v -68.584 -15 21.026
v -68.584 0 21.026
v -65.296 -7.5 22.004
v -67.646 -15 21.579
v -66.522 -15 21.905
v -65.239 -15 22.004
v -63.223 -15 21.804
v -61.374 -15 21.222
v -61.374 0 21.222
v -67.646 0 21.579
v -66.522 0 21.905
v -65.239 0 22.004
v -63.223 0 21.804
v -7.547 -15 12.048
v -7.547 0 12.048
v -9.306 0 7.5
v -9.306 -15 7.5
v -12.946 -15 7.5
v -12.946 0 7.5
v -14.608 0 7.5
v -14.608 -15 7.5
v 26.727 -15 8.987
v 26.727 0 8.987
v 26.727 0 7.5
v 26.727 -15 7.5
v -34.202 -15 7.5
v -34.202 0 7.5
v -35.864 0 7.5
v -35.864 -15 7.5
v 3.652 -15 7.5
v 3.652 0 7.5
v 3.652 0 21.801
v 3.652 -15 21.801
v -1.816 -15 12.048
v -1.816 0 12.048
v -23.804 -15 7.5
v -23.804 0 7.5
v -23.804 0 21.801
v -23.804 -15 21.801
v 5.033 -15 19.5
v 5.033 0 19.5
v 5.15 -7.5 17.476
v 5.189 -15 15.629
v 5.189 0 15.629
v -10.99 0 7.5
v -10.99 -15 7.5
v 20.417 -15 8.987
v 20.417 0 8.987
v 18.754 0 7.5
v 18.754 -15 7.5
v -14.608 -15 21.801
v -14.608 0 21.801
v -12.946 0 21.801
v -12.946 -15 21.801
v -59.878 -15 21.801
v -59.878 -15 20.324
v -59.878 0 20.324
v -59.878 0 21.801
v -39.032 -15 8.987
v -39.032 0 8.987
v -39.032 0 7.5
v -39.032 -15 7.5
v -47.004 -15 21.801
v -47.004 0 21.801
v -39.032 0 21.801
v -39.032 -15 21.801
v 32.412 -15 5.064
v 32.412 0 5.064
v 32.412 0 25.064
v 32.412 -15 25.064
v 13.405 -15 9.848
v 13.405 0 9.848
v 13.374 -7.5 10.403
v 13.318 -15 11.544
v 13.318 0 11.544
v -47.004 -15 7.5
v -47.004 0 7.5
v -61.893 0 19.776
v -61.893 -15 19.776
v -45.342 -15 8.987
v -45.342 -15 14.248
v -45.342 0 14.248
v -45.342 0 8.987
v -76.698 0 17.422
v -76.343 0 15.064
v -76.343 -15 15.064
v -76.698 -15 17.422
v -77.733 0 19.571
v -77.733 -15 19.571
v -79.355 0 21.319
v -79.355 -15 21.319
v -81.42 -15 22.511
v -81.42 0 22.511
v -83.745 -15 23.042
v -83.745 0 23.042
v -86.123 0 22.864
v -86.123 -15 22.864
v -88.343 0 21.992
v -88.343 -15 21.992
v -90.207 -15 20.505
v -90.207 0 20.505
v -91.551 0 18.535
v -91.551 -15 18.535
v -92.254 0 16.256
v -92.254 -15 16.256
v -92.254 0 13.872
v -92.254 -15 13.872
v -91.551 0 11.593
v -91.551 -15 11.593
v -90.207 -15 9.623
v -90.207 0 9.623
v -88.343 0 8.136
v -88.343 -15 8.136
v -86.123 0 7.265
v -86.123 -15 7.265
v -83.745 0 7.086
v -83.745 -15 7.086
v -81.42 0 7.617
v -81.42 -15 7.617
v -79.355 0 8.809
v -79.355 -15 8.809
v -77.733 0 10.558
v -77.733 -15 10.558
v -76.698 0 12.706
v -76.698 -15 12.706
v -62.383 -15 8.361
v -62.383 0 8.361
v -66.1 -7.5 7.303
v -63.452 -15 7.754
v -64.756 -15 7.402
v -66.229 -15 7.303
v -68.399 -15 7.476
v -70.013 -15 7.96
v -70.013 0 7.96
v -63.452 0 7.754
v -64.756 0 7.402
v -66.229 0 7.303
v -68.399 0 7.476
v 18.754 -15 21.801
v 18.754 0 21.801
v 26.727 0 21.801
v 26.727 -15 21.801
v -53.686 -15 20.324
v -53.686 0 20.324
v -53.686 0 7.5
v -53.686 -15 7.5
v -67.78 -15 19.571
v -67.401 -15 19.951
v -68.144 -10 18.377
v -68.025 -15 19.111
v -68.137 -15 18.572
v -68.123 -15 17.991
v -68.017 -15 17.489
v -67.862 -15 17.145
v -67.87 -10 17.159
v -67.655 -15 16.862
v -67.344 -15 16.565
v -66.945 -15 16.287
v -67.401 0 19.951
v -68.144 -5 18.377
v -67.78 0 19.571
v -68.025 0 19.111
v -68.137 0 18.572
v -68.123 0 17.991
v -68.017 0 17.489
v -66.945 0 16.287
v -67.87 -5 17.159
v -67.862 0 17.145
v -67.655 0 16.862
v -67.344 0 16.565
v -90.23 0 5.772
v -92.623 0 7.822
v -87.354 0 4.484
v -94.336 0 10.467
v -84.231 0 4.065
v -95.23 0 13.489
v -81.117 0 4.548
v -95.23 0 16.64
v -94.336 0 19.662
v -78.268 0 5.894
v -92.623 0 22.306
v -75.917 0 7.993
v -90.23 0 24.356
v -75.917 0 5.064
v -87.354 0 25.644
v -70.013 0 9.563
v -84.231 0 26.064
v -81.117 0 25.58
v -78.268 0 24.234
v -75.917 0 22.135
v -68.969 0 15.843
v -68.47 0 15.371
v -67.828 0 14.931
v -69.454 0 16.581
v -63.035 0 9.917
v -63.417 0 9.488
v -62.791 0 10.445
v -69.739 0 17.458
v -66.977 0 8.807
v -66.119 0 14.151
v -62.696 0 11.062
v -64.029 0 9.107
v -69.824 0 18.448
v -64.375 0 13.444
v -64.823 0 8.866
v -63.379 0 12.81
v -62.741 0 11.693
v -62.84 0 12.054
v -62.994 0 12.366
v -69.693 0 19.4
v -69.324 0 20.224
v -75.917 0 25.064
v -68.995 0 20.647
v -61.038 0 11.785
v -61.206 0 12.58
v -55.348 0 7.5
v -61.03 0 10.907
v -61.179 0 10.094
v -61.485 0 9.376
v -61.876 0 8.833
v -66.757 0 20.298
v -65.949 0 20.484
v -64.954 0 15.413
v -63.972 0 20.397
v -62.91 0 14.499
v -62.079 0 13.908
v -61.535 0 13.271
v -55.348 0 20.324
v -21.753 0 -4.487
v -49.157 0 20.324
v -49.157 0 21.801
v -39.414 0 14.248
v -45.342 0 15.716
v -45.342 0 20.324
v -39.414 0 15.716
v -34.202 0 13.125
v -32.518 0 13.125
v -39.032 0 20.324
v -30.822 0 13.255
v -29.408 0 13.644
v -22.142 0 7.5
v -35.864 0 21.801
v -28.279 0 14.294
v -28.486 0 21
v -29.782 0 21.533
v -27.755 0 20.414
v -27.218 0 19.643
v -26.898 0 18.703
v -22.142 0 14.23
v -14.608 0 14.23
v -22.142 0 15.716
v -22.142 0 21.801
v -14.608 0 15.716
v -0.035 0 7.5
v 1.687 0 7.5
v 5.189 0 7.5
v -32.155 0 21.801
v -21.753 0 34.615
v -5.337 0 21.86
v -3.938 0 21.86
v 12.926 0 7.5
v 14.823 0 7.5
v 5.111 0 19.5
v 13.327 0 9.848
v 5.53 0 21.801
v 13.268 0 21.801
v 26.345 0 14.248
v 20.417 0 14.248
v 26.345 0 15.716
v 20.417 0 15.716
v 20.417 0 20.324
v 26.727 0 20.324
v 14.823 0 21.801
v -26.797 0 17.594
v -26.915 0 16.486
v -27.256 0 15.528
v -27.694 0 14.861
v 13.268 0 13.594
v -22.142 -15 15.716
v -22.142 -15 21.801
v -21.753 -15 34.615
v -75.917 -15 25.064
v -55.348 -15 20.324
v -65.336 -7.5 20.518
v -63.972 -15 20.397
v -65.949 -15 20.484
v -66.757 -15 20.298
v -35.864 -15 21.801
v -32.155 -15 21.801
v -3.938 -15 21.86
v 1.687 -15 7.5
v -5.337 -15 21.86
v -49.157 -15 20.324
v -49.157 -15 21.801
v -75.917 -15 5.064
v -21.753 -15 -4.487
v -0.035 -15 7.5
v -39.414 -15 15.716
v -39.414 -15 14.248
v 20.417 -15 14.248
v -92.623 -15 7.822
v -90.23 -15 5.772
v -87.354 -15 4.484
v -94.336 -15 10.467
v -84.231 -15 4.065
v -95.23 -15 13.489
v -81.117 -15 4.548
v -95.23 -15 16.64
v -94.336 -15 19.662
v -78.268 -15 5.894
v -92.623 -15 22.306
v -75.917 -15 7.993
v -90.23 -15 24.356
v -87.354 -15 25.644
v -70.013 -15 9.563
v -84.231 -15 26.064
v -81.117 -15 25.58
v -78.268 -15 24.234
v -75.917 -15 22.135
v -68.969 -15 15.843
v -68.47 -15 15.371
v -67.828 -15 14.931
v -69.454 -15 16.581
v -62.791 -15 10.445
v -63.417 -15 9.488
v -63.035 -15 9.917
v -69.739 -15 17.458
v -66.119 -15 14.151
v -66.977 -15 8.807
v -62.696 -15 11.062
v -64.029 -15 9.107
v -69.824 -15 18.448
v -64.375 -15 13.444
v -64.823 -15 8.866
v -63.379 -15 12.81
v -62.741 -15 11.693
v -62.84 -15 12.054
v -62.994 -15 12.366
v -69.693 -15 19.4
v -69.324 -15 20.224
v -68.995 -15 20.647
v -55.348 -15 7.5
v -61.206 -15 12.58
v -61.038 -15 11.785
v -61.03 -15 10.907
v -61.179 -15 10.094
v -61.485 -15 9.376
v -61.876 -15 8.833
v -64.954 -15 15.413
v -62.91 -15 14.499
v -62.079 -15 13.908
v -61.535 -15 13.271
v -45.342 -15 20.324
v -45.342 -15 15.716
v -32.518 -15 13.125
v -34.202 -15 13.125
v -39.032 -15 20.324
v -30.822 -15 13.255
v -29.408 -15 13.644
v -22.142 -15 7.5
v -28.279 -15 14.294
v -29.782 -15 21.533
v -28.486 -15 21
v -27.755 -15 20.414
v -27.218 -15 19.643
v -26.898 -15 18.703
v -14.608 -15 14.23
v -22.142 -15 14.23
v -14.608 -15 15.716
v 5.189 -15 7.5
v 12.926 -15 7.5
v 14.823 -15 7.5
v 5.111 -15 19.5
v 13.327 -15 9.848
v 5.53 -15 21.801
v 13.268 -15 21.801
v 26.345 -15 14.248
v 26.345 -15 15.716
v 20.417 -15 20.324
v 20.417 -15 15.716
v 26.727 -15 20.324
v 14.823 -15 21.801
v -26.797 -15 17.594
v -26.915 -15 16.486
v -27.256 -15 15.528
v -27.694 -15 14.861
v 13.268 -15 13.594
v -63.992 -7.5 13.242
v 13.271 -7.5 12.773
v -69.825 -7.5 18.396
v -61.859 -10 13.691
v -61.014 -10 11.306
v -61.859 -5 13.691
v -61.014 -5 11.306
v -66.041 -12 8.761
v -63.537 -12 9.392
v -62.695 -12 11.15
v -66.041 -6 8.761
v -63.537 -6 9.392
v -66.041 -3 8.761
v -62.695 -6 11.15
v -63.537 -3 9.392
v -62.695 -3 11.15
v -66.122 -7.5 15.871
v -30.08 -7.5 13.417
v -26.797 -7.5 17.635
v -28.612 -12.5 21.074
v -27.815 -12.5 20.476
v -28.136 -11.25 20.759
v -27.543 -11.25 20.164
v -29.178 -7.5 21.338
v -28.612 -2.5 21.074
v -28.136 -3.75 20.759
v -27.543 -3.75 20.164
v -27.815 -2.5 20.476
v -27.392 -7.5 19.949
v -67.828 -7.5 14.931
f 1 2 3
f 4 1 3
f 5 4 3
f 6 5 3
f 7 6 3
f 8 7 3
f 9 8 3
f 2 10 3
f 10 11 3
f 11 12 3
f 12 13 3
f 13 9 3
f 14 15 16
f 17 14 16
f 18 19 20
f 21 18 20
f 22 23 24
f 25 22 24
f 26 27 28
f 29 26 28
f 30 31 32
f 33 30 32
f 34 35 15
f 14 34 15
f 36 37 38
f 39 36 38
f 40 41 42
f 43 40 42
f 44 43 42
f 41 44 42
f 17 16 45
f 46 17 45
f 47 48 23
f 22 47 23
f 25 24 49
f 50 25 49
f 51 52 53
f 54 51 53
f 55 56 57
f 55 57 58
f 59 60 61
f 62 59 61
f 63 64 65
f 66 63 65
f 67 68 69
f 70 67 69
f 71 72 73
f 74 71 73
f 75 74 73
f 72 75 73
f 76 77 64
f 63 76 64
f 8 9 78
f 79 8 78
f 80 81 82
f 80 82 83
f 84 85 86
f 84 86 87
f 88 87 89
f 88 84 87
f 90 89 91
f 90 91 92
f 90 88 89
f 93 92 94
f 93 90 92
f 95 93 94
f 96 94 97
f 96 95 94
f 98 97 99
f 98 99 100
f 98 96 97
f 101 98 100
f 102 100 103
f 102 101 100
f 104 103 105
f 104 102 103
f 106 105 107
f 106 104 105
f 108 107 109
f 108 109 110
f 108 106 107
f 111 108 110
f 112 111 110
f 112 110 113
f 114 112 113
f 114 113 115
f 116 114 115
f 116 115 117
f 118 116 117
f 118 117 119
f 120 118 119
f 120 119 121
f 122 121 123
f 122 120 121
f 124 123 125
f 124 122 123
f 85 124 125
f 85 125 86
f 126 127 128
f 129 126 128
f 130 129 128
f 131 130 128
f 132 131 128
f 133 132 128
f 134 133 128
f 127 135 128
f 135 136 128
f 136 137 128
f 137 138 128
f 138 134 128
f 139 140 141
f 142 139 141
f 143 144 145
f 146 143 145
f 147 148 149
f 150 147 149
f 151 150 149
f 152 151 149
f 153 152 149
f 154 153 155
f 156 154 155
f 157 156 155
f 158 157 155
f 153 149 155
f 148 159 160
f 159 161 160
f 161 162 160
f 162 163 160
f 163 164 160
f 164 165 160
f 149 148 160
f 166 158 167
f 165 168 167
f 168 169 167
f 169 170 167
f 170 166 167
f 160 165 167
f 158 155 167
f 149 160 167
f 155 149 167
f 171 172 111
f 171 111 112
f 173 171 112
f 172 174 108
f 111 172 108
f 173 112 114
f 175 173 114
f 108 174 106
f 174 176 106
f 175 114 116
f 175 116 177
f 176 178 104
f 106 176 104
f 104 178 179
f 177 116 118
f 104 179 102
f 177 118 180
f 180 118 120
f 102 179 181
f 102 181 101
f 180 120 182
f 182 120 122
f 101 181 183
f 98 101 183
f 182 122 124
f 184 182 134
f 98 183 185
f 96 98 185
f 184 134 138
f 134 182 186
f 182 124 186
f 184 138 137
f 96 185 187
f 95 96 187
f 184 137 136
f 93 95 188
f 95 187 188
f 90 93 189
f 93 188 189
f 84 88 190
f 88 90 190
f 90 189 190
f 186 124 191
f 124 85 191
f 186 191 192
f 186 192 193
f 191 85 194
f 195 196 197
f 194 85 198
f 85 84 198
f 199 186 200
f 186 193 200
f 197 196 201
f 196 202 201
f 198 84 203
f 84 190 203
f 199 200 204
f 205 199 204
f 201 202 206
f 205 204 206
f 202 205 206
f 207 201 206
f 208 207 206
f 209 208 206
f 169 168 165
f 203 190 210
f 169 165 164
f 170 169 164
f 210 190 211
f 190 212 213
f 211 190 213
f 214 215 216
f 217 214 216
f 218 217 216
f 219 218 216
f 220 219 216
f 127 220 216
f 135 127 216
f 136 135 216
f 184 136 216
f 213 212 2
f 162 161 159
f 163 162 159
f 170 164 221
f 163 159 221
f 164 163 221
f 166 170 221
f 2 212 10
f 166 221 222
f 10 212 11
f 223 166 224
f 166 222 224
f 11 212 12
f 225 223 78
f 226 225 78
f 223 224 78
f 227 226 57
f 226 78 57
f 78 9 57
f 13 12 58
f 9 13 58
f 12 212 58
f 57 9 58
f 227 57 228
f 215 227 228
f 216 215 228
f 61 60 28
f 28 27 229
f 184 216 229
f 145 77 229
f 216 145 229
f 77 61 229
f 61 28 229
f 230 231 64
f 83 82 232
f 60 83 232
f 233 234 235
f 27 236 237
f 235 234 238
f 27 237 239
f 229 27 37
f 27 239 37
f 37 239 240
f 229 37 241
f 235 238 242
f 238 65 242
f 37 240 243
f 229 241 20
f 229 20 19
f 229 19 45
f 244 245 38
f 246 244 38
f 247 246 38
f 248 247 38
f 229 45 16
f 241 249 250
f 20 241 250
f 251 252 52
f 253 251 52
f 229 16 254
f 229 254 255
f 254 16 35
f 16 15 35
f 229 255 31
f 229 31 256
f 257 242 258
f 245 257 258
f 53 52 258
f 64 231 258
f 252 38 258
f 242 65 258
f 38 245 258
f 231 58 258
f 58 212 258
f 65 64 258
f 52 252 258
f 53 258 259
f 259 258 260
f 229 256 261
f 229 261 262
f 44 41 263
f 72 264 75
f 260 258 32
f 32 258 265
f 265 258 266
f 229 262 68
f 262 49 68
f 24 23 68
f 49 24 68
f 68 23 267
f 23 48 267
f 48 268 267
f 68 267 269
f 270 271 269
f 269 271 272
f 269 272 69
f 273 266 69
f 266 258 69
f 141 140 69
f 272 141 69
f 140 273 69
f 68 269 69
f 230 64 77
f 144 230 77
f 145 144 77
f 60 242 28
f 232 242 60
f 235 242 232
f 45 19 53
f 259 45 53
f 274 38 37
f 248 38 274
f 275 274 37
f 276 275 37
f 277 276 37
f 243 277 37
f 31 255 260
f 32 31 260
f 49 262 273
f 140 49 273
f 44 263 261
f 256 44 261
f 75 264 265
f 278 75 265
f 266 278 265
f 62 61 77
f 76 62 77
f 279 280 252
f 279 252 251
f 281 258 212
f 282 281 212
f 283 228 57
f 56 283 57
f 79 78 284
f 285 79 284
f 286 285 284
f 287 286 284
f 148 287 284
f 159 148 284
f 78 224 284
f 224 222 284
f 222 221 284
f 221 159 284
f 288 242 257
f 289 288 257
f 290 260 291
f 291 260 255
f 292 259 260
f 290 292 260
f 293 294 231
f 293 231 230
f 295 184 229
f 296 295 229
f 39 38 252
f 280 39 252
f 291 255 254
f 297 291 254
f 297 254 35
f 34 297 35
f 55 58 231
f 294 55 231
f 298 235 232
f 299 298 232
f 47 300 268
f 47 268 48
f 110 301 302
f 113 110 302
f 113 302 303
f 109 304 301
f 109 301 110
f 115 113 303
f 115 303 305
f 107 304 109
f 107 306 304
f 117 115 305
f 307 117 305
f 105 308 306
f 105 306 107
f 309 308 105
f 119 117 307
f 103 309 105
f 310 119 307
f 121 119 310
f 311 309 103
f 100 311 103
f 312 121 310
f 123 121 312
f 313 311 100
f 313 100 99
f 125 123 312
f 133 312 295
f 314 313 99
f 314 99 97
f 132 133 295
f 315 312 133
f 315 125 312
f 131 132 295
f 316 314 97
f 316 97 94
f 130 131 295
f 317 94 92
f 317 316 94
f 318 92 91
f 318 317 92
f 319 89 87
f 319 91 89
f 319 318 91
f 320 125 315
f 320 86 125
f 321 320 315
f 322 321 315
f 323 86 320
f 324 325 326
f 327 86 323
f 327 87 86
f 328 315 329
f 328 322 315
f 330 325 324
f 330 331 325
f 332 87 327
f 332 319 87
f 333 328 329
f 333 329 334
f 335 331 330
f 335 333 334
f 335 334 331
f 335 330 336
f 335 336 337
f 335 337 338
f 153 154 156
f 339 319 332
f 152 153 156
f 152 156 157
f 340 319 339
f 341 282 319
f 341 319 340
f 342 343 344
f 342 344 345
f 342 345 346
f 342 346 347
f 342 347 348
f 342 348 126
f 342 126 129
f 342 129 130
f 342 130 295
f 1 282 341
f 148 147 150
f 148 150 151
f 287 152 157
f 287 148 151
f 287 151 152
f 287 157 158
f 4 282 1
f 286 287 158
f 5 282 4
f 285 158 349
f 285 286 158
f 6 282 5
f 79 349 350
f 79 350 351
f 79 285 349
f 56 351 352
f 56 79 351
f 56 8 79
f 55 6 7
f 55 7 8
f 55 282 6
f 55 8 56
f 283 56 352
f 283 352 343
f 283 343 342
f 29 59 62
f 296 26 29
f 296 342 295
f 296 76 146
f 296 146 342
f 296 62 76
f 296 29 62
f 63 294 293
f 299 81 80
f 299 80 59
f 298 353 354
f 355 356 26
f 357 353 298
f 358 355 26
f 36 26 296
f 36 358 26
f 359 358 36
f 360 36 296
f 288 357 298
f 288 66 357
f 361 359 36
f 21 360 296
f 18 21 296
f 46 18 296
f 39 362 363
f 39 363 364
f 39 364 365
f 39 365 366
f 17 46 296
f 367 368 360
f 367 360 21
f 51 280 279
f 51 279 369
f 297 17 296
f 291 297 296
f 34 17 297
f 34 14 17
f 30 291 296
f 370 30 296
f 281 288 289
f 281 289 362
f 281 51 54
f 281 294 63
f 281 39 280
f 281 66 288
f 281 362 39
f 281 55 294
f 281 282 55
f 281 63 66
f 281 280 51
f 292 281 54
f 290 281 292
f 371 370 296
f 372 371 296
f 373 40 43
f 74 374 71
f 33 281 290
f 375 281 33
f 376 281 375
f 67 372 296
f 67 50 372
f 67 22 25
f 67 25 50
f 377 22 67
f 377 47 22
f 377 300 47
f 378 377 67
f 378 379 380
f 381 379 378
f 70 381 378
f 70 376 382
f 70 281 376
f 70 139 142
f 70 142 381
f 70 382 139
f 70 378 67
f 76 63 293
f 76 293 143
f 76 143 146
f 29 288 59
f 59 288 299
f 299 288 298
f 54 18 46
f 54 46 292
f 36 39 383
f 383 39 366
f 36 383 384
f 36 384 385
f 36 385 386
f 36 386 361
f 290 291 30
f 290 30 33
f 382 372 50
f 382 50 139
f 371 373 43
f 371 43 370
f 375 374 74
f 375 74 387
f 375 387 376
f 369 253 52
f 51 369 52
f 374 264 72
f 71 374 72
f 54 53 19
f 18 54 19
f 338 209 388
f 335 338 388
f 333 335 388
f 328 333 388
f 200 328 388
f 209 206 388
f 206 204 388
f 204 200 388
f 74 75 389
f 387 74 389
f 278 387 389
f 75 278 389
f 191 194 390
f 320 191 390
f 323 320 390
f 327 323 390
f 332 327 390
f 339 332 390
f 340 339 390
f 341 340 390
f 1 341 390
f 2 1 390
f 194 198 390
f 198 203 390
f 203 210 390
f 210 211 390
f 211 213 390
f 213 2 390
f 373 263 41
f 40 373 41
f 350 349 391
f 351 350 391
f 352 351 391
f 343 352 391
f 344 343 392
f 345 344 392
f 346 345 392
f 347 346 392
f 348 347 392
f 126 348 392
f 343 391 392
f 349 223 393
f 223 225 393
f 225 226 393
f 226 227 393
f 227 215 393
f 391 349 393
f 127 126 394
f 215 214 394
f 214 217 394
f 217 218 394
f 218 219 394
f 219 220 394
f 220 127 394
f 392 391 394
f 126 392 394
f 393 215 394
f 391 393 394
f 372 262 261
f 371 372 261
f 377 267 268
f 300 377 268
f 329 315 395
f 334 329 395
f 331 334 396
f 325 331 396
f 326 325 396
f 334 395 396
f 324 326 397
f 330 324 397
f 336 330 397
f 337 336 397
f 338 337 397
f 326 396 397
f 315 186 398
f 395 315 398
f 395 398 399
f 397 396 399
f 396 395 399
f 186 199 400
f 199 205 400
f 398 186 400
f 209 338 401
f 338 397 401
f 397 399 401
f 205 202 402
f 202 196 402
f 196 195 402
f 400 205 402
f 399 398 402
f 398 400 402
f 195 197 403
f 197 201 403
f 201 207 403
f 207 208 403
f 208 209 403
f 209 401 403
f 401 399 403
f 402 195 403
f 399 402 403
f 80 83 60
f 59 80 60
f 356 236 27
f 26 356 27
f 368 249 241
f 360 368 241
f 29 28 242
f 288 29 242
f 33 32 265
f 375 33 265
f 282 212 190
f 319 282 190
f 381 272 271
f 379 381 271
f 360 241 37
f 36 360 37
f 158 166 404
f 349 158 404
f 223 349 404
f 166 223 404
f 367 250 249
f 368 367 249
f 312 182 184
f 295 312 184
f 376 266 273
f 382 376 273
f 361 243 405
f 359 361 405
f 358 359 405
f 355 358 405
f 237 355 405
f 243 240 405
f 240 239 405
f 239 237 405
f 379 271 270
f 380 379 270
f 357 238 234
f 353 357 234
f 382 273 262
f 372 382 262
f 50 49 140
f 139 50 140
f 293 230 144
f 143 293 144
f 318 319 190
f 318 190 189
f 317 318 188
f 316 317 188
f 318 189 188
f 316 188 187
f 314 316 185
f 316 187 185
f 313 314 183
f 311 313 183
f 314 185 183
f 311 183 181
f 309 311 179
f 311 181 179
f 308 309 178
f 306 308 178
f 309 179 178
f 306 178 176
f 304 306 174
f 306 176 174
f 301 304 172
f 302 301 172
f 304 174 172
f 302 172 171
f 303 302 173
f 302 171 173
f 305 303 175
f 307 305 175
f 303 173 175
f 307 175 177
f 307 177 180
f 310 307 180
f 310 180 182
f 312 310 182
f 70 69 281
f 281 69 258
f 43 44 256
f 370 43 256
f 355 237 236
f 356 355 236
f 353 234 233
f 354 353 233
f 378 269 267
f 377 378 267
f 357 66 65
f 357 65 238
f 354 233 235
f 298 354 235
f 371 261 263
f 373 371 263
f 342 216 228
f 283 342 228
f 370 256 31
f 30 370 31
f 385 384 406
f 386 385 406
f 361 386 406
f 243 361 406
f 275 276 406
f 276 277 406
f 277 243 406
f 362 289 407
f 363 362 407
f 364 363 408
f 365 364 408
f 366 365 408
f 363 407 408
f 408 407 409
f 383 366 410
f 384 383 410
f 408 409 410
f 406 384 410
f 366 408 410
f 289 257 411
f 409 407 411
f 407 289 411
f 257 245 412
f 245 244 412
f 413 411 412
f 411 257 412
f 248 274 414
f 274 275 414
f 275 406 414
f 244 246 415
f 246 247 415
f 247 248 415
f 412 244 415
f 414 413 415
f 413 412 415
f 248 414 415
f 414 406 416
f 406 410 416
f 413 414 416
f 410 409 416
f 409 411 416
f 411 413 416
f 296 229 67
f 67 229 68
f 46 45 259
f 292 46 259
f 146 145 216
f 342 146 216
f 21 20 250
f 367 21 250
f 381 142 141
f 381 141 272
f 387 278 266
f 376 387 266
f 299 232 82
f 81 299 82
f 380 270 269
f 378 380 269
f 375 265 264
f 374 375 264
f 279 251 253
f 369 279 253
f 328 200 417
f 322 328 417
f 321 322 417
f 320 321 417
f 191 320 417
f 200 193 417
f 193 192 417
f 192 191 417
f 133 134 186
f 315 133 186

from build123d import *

# Parameters (mm, degrees)
F0_R     = 8
F1_DEPTH = 15


with BuildPart() as f1:
    # F0 (on Front) → F1 (new body)
    with BuildSketch(Plane.XZ):
        Polygon((-21.752604651, 34.6147342483), (-75.9170310667, 25.0640844767), (-75.9170310667, 22.1353372474), (-75.9170310667, 15.0640844767), (-75.9170310667, 7.992831706), (-75.9170310667, 5.0640844767), (-21.752604651, -4.486565295), (32.4118217647, 5.0640844767), (32.4118217647, 25.0640844767), align=None)
        with BuildLine():
            add(Edge.make_bspline(
                [(-61.8588756487, 13.6911544495), (-61.0137733992, 12.770932), (-61.0137733992, 11.3060881009)],
                knots=[0, 0, 0, 1, 1, 1], degree=2))
            add(Edge.make_bspline(
                [(-61.0137733992, 11.3060881009), (-61.0137733992, 9.4186930769), (-62.3831520442, 8.3607502609)],
                knots=[0, 0, 0, 1, 1, 1], degree=2))
            add(Edge.make_bspline(
                [(-62.3831520442, 8.3607502609), (-63.7525306893, 7.3028074448), (-66.1000369379, 7.3028074448)],
                knots=[0, 0, 0, 1, 1, 1], degree=2))
            add(Edge.make_bspline(
                [(-66.1000369379, 7.3028074448), (-68.6416037031, 7.3028074448), (-70.0125473523, 7.9601091945)],
                knots=[0, 0, 0, 1, 1, 1], degree=2))
            Line((-70.0125473523, 7.9601091945), (-70.0125473523, 9.5626734602))
            add(Edge.make_bspline(
                [(-70.0125473523, 9.5626734602), (-69.1298850028, 9.1933324771), (-68.0938522451, 8.9773619022)],
                knots=[0, 0, 0, 1, 1, 1], degree=2))
            add(Edge.make_bspline(
                [(-68.0938522451, 8.9773619022), (-67.0578194874, 8.7613913273), (-66.0405667796, 8.7613913273)],
                knots=[0, 0, 0, 1, 1, 1], degree=2))
            add(Edge.make_bspline(
                [(-66.0405667796, 8.7613913273), (-64.3785323556, 8.7613913273), (-63.5365601144, 9.3920880061)],
                knots=[0, 0, 0, 1, 1, 1], degree=2))
            add(Edge.make_bspline(
                [(-63.5365601144, 9.3920880061), (-62.6945878732, 10.0227846849), (-62.6945878732, 11.1495876843)],
                knots=[0, 0, 0, 1, 1, 1], degree=2))
            add(Edge.make_bspline(
                [(-62.6945878732, 11.1495876843), (-62.6945878732, 11.8913996589), (-62.9935036689, 12.3655959211)],
                knots=[0, 0, 0, 1, 1, 1], degree=2))
            add(Edge.make_bspline(
                [(-62.9935036689, 12.3655959211), (-63.2924194645, 12.8397921833), (-63.9919763266, 13.2419982539)],
                knots=[0, 0, 0, 1, 1, 1], degree=2))
            add(Edge.make_bspline(
                [(-63.9919763266, 13.2419982539), (-64.6915331887, 13.6442043245), (-66.1188169879, 14.1512656742)],
                knots=[0, 0, 0, 1, 1, 1], degree=2))
            add(Edge.make_bspline(
                [(-66.1188169879, 14.1512656742), (-68.1126322951, 14.8649075738), (-68.9686895738, 15.8430351774)],
                knots=[0, 0, 0, 1, 1, 1], degree=2))
            add(Edge.make_bspline(
                [(-68.9686895738, 15.8430351774), (-69.8247468524, 16.821162781), (-69.8247468524, 18.3955569718)],
                knots=[0, 0, 0, 1, 1, 1], degree=2))
            add(Edge.make_bspline(
                [(-69.8247468524, 18.3955569718), (-69.8247468524, 20.0482013708), (-68.583698549, 21.0263289744)],
                knots=[0, 0, 0, 1, 1, 1], degree=2))
            add(Edge.make_bspline(
                [(-68.583698549, 21.0263289744), (-67.3426502455, 22.004456578), (-65.2956247967, 22.004456578)],
                knots=[0, 0, 0, 1, 1, 1], degree=2))
            add(Edge.make_bspline(
                [(-65.2956247967, 22.004456578), (-63.1640891229, 22.004456578), (-61.3737243573, 21.2219544952)],
                knots=[0, 0, 0, 1, 1, 1], degree=2))
            Line((-61.3737243573, 21.2219544952), (-61.8933057403, 19.775890646))
            add(Edge.make_bspline(
                [(-61.8933057403, 19.775890646), (-63.664890456, 20.5177026206), (-65.336314905, 20.5177026206)],
                knots=[0, 0, 0, 1, 1, 1], degree=2))
            add(Edge.make_bspline(
                [(-65.336314905, 20.5177026206), (-66.6571784209, 20.5177026206), (-67.4005553997, 19.9511711126)],
                knots=[0, 0, 0, 1, 1, 1], degree=2))
            add(Edge.make_bspline(
                [(-67.4005553997, 19.9511711126), (-68.1439323784, 19.3846396045), (-68.1439323784, 18.3767769218)],
                knots=[0, 0, 0, 1, 1, 1], degree=2))
            add(Edge.make_bspline(
                [(-68.1439323784, 18.3767769218), (-68.1439323784, 17.6349649472), (-67.8700566494, 17.1592036808)],
                knots=[0, 0, 0, 1, 1, 1], degree=2))
            add(Edge.make_bspline(
                [(-67.8700566494, 17.1592036808), (-67.5961809204, 16.6834424144), (-66.9451391874, 16.2874963605)],
                knots=[0, 0, 0, 1, 1, 1], degree=2))
            add(Edge.make_bspline(
                [(-66.9451391874, 16.2874963605), (-66.2940974545, 15.8915503066), (-64.9544538886, 15.4126590318)],
                knots=[0, 0, 0, 1, 1, 1], degree=2))
            add(Edge.make_bspline(
                [(-64.9544538886, 15.4126590318), (-62.7039778982, 14.611376899), (-61.8588756487, 13.6911544495)],
                knots=[0, 0, 0, 1, 1, 1], degree=2))
        make_face(mode=Mode.SUBTRACT)
        Polygon((-53.6864238951, 20.323642104), (-53.6864238951, 7.4999979697), (-55.3484583191, 7.4999979697), (-55.3484583191, 20.323642104), (-59.8775803748, 20.323642104), (-59.8775803748, 21.8010060365), (-49.1573018393, 21.8010060365), (-49.1573018393, 20.323642104), align=None, mode=Mode.SUBTRACT)
        Polygon((-39.0317248868, 8.9867519272), (-39.0317248868, 7.4999979697), (-47.0038561072, 7.4999979697), (-47.0038561072, 21.8010060365), (-39.0317248868, 21.8010060365), (-39.0317248868, 20.323642104), (-45.3418216832, 20.323642104), (-45.3418216832, 15.71626984), (-39.4135859033, 15.71626984), (-39.4135859033, 14.2482959325), (-45.3418216832, 14.2482959325), (-45.3418216832, 8.9867519272), align=None, mode=Mode.SUBTRACT)
        with BuildLine():
            add(Edge.make_bspline(
                [(-32.1550965825, 21.8010060365), (-26.7965223189, 21.8010060365), (-26.7965223189, 17.6349649472)],
                knots=[0, 0, 0, 1, 1, 1], degree=2))
            add(Edge.make_bspline(
                [(-26.7965223189, 17.6349649472), (-26.7965223189, 15.4627391651), (-28.2785812638, 14.2936810533)],
                knots=[0, 0, 0, 1, 1, 1], degree=2))
            add(Edge.make_bspline(
                [(-28.2785812638, 14.2936810533), (-29.7606402088, 13.1246229415), (-32.5181775489, 13.1246229415)],
                knots=[0, 0, 0, 1, 1, 1], degree=2))
            Line((-32.5181775489, 13.1246229415), (-34.2021220313, 13.1246229415))
            Line((-34.2021220313, 13.1246229415), (-34.2021220313, 7.4999979697))
            Line((-34.2021220313, 7.4999979697), (-35.8641564553, 7.4999979697))
            Line((-35.8641564553, 7.4999979697), (-35.8641564553, 21.8010060365))
            Line((-35.8641564553, 21.8010060365), (-32.1550965825, 21.8010060365))
        make_face(mode=Mode.SUBTRACT)
        Polygon((-12.9462354518, 21.8010060365), (-12.9462354518, 7.4999979697), (-14.6082698759, 7.4999979697), (-14.6082698759, 14.2295158825), (-22.1421999299, 14.2295158825), (-22.1421999299, 7.4999979697), (-23.8042343539, 7.4999979697), (-23.8042343539, 21.8010060365), (-22.1421999299, 21.8010060365), (-22.1421999299, 15.71626984), (-14.6082698759, 15.71626984), (-14.6082698759, 21.8010060365), align=None, mode=Mode.SUBTRACT)
        Polygon((1.6865534981, 7.4999979697), (-0.0349510843, 7.4999979697), (-1.8159258249, 12.0479000754), (-7.5469710799, 12.0479000754), (-9.3060357623, 7.4999979697), (-10.9899802446, 7.4999979697), (-5.3371851979, 21.8604761948), (-3.9380714737, 21.8604761948), align=None, mode=Mode.SUBTRACT)
        with BuildLine():
            Line((14.8231984655, 21.8010060365), (14.8231984655, 7.4999979697))
            Line((14.8231984655, 7.4999979697), (12.9264134166, 7.4999979697))
            Line((12.9264134166, 7.4999979697), (5.1107826128, 19.5004499128))
            Line((5.1107826128, 19.5004499128), (5.0325324045, 19.5004499128))
            add(Edge.make_bspline(
                [(5.0325324045, 19.5004499128), (5.1890328211, 17.387694289), (5.1890328211, 15.6286296067)],
                knots=[0, 0, 0, 1, 1, 1], degree=2))
            Line((5.1890328211, 15.6286296067), (5.1890328211, 7.4999979697))
            Line((5.1890328211, 7.4999979697), (3.6521987303, 7.4999979697))
            Line((3.6521987303, 7.4999979697), (3.6521987303, 21.8010060365))
            Line((3.6521987303, 21.8010060365), (5.5302037292, 21.8010060365))
            Line((5.5302037292, 21.8010060365), (13.327054483, 9.8475042184))
            Line((13.327054483, 9.8475042184), (13.4053046913, 9.8475042184))
            add(Edge.make_bspline(
                [(13.4053046913, 9.8475042184), (13.3865246413, 10.1104249182), (13.317664458, 11.5439687341)],
                knots=[0, 0, 0, 1, 1, 1], degree=2))
            add(Edge.make_bspline(
                [(13.317664458, 11.5439687341), (13.2488042748, 12.9775125499), (13.2675843247, 13.5941241912)],
                knots=[0, 0, 0, 1, 1, 1], degree=2))
            Line((13.2675843247, 13.5941241912), (13.2675843247, 21.8010060365))
            Line((13.2675843247, 21.8010060365), (14.8231984655, 21.8010060365))
        make_face(mode=Mode.SUBTRACT)
        Polygon((26.7266201503, 8.9867519272), (26.7266201503, 7.4999979697), (18.7544889299, 7.4999979697), (18.7544889299, 21.8010060365), (26.7266201503, 21.8010060365), (26.7266201503, 20.323642104), (20.416523354, 20.323642104), (20.416523354, 15.71626984), (26.3447591339, 15.71626984), (26.3447591339, 14.2482959325), (20.416523354, 14.2482959325), (20.416523354, 8.9867519272), align=None, mode=Mode.SUBTRACT)
        with BuildLine():
            Line((-75.9170310667, 15.0640844767), (-75.9170310667, 22.1353372474))
            ThreePointArc((-75.9170310667, 22.1353372474), (-95.3430256224, 15.0640844767), (-75.9170310667, 7.992831706))
            Line((-75.9170310667, 7.992831706), (-75.9170310667, 15.0640844767))
        make_face()
        with Locations((-84.3430256224, 15.0640844767)):
            Circle(F0_R, mode=Mode.SUBTRACT)
    extrude(amount=F1_DEPTH)


solid = f1.part
